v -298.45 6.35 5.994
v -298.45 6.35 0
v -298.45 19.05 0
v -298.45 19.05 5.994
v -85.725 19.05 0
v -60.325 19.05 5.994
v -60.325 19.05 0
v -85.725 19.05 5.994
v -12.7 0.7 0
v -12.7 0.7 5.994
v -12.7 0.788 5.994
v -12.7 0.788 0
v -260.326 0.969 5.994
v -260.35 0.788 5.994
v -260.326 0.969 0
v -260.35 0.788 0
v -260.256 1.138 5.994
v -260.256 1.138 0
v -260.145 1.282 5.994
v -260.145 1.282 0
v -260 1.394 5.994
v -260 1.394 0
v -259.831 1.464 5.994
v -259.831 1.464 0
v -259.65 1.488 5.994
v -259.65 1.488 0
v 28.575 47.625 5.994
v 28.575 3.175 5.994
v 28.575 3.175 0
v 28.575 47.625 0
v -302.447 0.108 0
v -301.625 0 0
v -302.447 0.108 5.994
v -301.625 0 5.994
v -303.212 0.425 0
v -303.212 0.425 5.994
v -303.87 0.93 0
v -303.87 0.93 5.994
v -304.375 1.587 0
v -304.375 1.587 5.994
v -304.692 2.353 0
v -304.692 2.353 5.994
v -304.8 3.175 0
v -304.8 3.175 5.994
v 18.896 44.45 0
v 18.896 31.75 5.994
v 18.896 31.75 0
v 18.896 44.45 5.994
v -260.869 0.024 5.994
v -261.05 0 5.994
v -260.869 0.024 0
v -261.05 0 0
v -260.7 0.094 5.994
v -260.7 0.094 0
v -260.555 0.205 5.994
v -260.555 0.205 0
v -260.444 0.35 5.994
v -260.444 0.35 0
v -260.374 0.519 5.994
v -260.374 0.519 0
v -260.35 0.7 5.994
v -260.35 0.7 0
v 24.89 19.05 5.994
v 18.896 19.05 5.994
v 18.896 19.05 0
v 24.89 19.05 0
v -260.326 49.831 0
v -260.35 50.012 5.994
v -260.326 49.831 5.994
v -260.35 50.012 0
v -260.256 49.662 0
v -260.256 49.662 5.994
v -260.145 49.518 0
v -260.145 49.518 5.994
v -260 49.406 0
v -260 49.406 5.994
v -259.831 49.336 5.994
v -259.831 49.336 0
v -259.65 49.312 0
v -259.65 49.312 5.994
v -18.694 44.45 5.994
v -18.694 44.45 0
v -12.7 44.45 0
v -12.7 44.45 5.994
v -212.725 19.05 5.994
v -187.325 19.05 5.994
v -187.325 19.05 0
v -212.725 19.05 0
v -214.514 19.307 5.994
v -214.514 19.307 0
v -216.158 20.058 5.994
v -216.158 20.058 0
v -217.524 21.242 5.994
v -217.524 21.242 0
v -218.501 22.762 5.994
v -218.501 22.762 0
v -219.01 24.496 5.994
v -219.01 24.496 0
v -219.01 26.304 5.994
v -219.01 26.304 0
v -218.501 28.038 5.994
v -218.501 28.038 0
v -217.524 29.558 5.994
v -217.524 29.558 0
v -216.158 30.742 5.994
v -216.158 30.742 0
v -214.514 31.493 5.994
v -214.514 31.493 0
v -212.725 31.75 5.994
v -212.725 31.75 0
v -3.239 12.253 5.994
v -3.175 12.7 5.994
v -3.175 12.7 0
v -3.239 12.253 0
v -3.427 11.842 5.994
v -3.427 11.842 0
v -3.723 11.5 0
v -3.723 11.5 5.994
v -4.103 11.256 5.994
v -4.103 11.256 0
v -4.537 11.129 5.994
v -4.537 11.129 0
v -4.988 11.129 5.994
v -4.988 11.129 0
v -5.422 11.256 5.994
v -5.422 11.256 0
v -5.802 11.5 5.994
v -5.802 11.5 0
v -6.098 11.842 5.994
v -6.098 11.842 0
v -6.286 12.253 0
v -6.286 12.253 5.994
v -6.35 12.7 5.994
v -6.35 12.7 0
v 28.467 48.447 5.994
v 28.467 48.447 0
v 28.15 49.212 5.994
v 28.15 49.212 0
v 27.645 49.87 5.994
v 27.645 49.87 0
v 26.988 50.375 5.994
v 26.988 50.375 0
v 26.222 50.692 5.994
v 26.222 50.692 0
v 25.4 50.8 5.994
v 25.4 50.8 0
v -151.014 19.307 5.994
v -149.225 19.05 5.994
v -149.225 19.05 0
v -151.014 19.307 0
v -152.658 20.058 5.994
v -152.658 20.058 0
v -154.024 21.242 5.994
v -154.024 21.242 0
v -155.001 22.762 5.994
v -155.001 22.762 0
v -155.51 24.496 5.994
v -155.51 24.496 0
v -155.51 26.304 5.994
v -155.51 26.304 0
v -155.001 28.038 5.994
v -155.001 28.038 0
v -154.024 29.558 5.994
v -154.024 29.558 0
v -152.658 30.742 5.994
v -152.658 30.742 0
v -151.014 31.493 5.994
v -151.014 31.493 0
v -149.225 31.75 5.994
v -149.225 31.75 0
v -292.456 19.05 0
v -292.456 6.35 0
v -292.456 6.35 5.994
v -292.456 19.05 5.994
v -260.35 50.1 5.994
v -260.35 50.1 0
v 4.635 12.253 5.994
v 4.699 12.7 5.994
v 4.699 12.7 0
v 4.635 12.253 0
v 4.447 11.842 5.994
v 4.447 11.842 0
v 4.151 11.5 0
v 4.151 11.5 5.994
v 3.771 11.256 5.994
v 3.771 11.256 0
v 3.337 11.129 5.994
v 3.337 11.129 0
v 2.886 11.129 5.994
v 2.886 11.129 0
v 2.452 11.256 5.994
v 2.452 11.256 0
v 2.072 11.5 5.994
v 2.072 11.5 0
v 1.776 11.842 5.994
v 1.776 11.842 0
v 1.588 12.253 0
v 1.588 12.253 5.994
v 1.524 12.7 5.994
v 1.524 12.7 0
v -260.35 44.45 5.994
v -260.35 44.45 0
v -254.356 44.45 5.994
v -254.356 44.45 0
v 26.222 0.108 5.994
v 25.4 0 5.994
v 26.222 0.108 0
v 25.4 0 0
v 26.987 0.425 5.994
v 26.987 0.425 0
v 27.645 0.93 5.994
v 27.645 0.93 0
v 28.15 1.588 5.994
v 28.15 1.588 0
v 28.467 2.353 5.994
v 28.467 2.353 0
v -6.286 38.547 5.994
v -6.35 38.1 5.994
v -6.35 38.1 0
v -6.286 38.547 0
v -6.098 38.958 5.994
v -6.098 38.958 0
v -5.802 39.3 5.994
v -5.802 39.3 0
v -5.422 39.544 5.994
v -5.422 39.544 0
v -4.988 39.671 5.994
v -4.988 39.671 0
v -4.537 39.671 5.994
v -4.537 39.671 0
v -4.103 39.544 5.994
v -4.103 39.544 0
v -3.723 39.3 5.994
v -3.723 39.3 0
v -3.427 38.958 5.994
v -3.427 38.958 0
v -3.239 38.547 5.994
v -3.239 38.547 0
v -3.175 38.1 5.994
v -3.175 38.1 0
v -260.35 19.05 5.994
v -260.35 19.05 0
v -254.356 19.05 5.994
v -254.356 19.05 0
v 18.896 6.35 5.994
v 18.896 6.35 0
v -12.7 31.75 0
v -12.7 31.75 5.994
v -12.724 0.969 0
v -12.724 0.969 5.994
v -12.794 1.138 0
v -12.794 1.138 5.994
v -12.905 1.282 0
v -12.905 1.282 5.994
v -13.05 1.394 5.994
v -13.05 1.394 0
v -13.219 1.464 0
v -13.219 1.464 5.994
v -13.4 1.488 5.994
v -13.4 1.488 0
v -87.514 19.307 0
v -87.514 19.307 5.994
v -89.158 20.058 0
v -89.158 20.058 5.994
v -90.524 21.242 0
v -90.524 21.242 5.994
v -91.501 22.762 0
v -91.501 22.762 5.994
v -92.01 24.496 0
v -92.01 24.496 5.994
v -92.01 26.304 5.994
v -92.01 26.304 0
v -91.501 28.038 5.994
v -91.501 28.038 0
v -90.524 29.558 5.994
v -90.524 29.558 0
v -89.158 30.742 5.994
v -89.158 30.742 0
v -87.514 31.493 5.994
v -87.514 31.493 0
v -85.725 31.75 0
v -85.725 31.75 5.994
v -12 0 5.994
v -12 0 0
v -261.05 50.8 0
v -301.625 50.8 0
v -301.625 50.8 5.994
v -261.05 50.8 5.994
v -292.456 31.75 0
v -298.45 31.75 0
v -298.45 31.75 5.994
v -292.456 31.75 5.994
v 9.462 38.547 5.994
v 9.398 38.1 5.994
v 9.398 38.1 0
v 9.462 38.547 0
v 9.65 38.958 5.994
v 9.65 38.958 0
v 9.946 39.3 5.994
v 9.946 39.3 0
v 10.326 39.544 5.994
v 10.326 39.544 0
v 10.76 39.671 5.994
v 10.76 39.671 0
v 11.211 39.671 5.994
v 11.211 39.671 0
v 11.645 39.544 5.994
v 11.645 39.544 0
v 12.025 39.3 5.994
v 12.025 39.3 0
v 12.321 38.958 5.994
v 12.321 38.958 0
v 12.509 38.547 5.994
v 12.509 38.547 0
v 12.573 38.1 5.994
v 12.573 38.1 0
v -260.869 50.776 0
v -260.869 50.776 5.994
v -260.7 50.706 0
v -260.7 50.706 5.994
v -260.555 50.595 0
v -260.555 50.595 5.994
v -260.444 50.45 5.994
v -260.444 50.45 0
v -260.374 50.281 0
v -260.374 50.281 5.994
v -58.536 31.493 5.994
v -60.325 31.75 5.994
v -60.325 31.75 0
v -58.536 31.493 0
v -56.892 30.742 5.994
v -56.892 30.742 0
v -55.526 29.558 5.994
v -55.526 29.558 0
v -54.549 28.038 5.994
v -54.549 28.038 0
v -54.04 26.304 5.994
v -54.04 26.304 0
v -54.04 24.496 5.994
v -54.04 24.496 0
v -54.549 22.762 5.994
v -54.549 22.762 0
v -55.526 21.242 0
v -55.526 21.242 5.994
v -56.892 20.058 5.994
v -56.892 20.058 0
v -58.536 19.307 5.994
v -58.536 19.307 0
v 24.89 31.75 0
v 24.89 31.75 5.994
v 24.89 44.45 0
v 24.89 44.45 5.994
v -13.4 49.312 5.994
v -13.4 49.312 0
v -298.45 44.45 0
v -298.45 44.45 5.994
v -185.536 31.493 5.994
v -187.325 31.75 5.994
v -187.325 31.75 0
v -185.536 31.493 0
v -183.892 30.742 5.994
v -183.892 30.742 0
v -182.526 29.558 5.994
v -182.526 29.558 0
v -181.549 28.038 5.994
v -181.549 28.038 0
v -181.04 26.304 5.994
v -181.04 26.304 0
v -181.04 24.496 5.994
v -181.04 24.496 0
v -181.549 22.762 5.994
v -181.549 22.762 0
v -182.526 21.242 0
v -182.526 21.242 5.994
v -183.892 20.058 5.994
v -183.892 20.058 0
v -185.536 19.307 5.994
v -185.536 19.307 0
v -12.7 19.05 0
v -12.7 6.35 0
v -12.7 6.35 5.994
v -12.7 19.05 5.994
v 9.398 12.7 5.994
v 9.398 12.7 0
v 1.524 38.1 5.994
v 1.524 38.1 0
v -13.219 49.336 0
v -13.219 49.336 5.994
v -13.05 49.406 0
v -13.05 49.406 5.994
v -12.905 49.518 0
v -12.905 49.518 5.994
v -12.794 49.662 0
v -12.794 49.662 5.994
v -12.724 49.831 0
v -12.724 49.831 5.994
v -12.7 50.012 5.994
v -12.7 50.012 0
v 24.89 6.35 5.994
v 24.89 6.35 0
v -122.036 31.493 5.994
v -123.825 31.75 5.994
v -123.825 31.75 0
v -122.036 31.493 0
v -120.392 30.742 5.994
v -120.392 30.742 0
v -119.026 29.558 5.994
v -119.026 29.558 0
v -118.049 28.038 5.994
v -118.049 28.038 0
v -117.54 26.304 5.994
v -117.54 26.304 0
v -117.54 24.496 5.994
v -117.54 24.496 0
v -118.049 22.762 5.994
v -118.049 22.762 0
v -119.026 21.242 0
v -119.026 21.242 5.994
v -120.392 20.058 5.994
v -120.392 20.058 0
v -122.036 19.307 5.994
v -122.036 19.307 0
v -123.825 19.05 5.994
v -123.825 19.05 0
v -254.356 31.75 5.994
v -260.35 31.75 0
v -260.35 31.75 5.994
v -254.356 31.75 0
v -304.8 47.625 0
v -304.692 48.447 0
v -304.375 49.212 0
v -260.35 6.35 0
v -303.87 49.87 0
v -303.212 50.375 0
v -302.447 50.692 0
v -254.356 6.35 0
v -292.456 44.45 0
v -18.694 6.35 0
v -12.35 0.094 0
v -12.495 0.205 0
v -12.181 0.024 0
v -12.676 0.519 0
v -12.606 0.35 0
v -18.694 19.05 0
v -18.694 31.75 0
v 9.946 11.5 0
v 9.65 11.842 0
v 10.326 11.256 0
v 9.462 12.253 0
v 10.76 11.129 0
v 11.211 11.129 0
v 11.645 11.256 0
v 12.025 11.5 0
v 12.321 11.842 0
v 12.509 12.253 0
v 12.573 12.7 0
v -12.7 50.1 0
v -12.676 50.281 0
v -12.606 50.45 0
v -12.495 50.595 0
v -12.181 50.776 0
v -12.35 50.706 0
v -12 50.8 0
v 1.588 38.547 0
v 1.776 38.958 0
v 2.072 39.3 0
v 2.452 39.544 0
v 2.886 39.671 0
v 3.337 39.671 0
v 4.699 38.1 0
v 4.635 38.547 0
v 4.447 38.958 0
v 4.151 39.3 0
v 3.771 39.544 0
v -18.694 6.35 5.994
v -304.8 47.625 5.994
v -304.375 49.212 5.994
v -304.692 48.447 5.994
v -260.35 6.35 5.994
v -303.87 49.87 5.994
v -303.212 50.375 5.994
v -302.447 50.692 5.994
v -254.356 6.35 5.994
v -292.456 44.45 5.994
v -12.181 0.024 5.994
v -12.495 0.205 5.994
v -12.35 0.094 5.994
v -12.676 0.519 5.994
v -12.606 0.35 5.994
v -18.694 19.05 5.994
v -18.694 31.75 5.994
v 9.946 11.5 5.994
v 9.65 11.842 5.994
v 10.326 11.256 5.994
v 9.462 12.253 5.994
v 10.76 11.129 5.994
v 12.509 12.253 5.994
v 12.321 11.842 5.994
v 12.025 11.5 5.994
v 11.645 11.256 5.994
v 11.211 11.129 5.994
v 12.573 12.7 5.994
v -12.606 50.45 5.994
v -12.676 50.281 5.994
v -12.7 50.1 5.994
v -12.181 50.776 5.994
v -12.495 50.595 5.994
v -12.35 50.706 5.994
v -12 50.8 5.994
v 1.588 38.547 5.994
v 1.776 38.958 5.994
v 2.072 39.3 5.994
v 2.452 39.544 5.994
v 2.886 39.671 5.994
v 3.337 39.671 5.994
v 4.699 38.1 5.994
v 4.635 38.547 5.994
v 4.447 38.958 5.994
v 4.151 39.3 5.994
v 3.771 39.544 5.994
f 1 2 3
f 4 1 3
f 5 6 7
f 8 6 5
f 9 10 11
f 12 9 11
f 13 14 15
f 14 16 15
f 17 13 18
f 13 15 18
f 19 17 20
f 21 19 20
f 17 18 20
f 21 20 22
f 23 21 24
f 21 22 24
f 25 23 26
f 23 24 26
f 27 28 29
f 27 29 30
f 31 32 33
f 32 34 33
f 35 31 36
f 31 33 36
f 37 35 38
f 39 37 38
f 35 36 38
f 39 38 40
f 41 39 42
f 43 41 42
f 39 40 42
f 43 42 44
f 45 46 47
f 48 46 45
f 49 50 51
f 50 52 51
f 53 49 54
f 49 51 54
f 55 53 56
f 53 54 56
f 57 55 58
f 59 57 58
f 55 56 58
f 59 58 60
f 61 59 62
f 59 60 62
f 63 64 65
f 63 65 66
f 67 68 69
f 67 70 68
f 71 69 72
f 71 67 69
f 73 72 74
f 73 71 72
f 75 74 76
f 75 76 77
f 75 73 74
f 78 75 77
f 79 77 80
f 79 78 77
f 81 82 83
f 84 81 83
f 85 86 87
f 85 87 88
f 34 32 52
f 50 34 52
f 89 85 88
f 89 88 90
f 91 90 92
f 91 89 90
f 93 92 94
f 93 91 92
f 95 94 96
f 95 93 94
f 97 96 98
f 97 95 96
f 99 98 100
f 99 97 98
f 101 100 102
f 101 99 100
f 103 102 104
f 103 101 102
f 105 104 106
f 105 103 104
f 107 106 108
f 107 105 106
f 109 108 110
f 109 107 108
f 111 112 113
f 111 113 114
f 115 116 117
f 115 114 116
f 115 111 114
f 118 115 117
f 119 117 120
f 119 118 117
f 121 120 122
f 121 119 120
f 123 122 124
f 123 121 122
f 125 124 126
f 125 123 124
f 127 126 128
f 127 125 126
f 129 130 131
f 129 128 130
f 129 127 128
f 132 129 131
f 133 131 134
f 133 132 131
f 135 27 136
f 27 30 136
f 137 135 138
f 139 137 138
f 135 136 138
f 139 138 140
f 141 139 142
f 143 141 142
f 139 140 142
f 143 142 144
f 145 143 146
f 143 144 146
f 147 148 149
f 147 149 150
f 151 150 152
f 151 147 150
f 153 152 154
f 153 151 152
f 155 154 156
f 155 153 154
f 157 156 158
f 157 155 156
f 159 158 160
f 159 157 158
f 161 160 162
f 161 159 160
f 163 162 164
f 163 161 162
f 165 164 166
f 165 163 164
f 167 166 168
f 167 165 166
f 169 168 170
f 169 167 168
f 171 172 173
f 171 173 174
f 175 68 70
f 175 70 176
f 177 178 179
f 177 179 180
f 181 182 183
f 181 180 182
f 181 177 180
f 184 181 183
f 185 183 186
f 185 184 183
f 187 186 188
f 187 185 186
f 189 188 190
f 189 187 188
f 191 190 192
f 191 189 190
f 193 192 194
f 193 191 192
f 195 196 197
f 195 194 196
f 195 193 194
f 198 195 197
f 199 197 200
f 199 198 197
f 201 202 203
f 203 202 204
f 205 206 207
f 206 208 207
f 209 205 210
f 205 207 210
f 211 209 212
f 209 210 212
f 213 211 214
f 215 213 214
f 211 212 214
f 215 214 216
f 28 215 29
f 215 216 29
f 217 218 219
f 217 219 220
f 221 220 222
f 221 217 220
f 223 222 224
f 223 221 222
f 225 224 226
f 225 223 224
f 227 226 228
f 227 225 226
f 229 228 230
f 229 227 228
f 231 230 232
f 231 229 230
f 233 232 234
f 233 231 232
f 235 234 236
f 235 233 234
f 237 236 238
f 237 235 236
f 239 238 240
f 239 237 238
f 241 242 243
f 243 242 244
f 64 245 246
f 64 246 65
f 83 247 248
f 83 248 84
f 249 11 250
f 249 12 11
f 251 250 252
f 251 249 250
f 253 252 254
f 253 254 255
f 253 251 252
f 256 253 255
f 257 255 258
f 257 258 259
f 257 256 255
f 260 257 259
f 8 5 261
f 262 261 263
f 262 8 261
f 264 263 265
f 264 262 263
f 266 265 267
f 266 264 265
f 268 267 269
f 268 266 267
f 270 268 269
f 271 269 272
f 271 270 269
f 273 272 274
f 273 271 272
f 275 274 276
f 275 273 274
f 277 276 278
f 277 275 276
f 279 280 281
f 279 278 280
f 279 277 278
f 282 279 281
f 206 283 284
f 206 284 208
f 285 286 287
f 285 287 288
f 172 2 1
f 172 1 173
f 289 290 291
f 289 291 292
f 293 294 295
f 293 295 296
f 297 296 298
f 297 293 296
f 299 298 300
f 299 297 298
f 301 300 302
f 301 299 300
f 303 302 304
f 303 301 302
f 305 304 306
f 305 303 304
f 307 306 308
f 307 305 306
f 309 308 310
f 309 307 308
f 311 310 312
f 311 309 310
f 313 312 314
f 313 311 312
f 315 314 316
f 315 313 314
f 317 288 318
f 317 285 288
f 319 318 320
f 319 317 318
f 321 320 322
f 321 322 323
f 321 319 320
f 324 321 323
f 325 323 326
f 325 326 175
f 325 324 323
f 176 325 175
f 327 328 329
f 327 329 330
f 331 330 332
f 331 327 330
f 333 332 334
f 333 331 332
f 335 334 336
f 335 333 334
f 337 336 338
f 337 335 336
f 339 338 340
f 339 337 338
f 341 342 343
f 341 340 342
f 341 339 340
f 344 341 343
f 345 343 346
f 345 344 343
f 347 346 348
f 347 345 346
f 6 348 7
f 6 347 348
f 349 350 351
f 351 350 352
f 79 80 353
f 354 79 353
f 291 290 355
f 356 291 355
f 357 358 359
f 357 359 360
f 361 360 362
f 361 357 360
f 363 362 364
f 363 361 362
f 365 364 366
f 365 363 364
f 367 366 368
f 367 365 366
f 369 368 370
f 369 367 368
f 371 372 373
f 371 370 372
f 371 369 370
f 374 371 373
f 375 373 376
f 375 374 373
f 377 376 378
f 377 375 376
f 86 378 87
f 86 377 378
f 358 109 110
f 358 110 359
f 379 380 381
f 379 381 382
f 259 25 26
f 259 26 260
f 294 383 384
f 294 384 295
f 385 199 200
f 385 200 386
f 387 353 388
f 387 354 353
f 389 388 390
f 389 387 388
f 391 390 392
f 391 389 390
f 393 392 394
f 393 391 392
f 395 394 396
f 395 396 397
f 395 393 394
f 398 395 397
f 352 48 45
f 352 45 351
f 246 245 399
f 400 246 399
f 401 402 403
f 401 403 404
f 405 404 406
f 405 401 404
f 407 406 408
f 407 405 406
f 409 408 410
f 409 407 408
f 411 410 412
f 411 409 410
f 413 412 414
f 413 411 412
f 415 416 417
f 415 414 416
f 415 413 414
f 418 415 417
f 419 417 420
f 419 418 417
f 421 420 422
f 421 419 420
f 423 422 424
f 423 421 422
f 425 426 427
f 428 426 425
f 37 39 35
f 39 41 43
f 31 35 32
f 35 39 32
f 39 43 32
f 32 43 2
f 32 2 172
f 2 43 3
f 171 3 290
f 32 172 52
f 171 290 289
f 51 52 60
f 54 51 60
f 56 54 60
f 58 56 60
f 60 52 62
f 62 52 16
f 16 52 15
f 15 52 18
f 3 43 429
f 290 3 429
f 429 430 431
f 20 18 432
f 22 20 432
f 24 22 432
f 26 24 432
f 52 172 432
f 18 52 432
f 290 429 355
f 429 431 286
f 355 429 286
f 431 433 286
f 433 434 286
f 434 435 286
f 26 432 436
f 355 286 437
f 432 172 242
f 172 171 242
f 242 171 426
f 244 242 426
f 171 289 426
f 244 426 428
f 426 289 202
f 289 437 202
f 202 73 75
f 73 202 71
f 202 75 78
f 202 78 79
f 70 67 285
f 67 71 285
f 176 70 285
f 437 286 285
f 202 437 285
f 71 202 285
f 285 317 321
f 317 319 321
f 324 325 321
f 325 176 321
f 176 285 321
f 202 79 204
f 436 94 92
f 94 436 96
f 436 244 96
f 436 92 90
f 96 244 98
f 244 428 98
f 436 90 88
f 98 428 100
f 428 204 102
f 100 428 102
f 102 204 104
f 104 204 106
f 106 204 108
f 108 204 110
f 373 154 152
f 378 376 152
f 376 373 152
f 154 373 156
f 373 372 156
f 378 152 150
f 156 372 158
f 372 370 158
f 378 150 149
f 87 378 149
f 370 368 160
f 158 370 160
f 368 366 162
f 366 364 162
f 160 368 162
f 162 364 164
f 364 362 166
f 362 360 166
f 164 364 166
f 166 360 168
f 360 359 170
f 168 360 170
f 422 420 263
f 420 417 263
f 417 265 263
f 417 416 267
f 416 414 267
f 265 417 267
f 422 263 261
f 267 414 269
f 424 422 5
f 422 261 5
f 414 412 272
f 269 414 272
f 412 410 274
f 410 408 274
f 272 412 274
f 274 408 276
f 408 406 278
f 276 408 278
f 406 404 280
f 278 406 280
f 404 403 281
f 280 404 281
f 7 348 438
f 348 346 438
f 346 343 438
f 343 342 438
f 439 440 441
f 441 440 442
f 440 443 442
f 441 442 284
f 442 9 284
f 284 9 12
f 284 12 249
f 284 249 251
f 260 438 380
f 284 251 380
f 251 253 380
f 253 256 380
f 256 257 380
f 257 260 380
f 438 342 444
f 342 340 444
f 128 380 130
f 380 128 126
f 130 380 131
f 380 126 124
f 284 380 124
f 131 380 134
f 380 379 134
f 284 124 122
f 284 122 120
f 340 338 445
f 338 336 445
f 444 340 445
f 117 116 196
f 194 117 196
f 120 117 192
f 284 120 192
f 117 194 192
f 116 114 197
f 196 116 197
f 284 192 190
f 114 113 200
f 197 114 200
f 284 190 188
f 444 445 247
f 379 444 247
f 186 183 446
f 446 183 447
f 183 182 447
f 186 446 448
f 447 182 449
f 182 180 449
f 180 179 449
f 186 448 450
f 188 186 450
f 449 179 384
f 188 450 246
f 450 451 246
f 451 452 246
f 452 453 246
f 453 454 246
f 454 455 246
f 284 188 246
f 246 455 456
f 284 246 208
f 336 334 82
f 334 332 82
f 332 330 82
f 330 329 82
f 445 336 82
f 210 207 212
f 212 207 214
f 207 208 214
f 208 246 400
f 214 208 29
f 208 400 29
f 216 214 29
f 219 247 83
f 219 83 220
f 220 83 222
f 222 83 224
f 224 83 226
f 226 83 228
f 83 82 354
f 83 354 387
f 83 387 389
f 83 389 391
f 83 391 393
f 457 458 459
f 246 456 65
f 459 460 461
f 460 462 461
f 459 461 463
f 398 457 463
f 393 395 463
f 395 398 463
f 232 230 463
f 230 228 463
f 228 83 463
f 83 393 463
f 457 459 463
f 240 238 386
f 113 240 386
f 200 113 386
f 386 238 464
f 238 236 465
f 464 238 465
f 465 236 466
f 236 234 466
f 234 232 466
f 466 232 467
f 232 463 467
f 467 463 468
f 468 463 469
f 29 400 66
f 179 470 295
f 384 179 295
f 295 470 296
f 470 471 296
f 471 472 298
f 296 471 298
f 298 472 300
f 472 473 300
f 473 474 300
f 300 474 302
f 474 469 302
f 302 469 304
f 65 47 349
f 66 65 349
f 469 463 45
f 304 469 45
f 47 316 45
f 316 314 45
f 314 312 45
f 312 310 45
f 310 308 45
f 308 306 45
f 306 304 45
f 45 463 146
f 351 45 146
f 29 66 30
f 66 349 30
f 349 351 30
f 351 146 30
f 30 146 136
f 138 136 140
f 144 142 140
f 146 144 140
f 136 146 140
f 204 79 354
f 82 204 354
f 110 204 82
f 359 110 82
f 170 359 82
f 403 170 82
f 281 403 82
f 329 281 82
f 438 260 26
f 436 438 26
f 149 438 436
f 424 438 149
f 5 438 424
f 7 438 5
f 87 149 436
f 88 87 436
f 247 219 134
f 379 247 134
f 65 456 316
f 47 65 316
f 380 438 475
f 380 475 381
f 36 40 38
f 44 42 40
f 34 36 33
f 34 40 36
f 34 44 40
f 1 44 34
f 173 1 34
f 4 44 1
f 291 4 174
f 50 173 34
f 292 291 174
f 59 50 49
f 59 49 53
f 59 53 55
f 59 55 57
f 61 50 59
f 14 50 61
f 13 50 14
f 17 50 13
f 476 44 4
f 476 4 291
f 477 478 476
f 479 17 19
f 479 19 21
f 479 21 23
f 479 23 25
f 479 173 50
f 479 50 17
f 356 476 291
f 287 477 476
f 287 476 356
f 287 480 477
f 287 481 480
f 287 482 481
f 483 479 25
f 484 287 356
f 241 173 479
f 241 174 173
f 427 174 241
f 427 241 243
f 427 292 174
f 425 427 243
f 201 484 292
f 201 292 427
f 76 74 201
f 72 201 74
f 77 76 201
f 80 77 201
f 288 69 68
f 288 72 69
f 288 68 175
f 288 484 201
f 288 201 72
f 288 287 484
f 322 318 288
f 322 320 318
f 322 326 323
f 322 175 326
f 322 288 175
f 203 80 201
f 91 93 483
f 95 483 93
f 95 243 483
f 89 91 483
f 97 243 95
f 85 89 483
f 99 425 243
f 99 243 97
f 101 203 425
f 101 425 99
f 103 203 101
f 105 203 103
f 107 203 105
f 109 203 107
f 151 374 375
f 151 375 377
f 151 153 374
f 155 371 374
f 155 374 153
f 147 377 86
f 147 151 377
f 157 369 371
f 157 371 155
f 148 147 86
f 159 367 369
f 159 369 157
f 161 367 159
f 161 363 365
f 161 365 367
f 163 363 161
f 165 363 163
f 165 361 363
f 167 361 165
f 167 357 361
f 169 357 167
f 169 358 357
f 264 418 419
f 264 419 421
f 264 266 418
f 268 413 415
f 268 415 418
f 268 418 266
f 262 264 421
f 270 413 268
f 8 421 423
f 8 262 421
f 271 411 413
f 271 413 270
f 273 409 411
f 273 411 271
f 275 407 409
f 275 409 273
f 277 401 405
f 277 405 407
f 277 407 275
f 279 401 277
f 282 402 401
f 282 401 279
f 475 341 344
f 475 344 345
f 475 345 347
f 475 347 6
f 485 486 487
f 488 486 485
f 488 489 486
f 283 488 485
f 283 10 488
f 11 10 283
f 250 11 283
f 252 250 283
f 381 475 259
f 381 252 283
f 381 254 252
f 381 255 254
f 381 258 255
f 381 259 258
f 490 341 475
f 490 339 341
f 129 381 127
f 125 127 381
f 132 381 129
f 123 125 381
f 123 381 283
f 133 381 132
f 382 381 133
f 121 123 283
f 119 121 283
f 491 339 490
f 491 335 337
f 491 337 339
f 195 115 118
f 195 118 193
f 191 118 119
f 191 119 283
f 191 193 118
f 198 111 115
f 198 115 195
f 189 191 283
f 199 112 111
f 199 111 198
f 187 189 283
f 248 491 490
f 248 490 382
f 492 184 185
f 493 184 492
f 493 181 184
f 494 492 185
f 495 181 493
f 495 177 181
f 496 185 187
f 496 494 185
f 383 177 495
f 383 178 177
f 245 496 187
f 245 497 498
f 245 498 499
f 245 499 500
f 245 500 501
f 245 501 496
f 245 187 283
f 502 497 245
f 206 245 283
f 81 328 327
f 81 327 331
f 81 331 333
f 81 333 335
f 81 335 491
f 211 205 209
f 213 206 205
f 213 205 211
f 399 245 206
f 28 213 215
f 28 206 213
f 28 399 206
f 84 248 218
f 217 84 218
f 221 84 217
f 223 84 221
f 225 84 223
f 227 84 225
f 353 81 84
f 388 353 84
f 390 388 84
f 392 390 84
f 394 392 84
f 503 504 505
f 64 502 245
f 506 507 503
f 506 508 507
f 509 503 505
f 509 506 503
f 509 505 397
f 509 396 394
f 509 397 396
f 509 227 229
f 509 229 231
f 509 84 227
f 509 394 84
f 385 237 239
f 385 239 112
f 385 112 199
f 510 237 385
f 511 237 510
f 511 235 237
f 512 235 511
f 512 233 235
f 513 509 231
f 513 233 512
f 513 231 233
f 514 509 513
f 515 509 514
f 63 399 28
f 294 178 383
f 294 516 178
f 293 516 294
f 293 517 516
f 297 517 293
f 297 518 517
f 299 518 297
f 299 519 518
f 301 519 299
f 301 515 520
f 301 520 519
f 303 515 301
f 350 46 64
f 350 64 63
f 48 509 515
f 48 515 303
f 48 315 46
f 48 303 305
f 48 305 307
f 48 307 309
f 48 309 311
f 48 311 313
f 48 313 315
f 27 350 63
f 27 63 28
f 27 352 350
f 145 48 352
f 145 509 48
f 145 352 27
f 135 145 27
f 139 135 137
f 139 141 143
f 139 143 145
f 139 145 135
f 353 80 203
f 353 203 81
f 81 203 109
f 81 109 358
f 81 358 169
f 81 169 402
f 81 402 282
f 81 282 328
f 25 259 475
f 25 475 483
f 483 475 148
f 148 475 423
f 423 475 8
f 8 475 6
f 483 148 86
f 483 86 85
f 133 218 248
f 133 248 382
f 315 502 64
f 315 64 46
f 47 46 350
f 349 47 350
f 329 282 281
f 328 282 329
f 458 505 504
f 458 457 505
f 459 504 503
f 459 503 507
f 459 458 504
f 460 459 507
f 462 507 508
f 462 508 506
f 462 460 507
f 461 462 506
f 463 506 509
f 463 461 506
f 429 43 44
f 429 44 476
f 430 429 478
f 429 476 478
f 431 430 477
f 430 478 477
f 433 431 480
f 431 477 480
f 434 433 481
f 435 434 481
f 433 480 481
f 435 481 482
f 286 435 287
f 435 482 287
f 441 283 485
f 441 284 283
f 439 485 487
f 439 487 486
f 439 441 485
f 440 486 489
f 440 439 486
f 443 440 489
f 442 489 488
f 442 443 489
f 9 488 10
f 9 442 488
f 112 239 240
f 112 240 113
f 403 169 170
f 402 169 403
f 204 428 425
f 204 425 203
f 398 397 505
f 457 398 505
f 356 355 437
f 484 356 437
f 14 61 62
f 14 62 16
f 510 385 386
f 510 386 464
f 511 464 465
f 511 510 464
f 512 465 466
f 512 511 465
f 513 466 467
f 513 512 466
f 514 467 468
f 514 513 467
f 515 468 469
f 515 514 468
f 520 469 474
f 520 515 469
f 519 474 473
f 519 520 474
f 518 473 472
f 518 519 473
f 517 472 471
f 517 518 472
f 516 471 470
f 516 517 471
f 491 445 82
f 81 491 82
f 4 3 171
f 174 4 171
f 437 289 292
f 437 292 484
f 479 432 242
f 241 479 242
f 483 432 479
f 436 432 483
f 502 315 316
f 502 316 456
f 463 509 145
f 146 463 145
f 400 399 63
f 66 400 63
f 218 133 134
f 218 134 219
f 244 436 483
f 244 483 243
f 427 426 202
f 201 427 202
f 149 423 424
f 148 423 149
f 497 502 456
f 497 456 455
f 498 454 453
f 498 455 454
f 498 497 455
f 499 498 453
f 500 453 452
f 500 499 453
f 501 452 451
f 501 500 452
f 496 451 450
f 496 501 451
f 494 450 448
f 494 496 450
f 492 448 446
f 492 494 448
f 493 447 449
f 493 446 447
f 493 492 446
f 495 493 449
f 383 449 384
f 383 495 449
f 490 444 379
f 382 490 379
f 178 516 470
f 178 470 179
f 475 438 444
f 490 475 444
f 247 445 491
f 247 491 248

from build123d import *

# Parameters (mm, degrees)
SKETCH1_W           = 304.8
SKETCH1_H           = 50.8
SKETCH1_W_2         = 5.9944
SKETCH1_H_2         = 12.7
BOSS_EXTRUDE1_DEPTH = 5.9944
SKETCH3_W           = 247.65
SKETCH3_H           = 1.4875
CUT_EXTRUDE3_DEPTH  = 6.9944
FILLET4_R           = 0.7
SKETCH4_W           = 28.575
SKETCH4_H           = 50.8
BOSS_EXTRUDE2_DEPTH = 5.9944
SKETCH5_W           = 5.9944
SKETCH5_H           = 12.7
CUT_EXTRUDE4_DEPTH  = 6.9944
FILLET5_R           = 3.175
CUT_EXTRUDE5_DEPTH  = 6.9944
CUT_EXTRUDE6_DEPTH  = 6.9944


with BuildPart() as part:
    # Sketch1 → Boss-Extrude1 (new body)
    with BuildSketch(Plane.XY):
        with Locations((-152.4, 25.4)):
            Rectangle(SKETCH1_W, SKETCH1_H)
        with Locations((-15.6972, 12.7)):
            Rectangle(SKETCH1_W_2, SKETCH1_H_2, mode=Mode.SUBTRACT)
        with Locations((-15.6972, 38.1)):
            Rectangle(SKETCH1_W_2, SKETCH1_H_2, mode=Mode.SUBTRACT)
        with Locations((-257.3528, 38.1)):
            Rectangle(SKETCH1_W_2, SKETCH1_H_2, mode=Mode.SUBTRACT)
        with Locations((-257.3528, 12.7)):
            Rectangle(SKETCH1_W_2, SKETCH1_H_2, mode=Mode.SUBTRACT)
        with Locations((-295.4528, 12.7)):
            Rectangle(SKETCH1_W_2, SKETCH1_H_2, mode=Mode.SUBTRACT)
        with Locations((-295.4528, 38.1)):
            Rectangle(SKETCH1_W_2, SKETCH1_H_2, mode=Mode.SUBTRACT)
    extrude(amount=BOSS_EXTRUDE1_DEPTH)

    # Sketch3 → Cut-Extrude3 (cut, through all)
    with BuildSketch(Plane.XY.offset(5.9944)):
        with Locations((-136.525, 50.05625)):
            Rectangle(SKETCH3_W, SKETCH3_H)
        with Locations((-136.525, 0.74375)):
            Rectangle(SKETCH3_W, SKETCH3_H)
    extrude(amount=-CUT_EXTRUDE3_DEPTH, mode=Mode.SUBTRACT)

    # Fillet4
    fillet4_edges = [part.edges().sort_by_distance(p)[0] for p in [
        (-260.35, 49.3125, 2.9972),
        (-260.35, 50.8, 2.9972),
        (-12.7, 50.8, 2.9972),
        (-12.7, 49.3125, 2.9972),
        (-12.7, 0, 2.9972),
        (-260.35, 0, 2.9972),
        (-260.35, 1.4875, 2.9972),
        (-12.7, 1.4875, 2.9972),
    ]]
    fillet(fillet4_edges, radius=FILLET4_R)

    # Sketch4 → Boss-Extrude2 (add)
    with BuildSketch(Plane.XY.offset(5.9944)):
        with Locations((14.2875, 25.4)):
            Rectangle(SKETCH4_W, SKETCH4_H)
    extrude(amount=-BOSS_EXTRUDE2_DEPTH)

    # Sketch5 → Cut-Extrude4 (cut, through all)
    with BuildSketch(Plane.XY.offset(5.9944)):
        with Locations((21.893276, 38.1)):
            Rectangle(SKETCH5_W, SKETCH5_H)
        with Locations((21.893276, 12.7)):
            Rectangle(SKETCH5_W, SKETCH5_H)
    extrude(amount=-CUT_EXTRUDE4_DEPTH, mode=Mode.SUBTRACT)

    # Fillet5
    fillet5_edges = [part.edges().sort_by_distance(p)[0] for p in [
        (28.575, 50.8, 2.9972),
        (28.575, 0, 2.9972),
        (-304.8, 0, 2.9972),
        (-304.8, 50.8, 2.9972),
    ]]
    fillet(fillet5_edges, radius=FILLET5_R)

    # Sketch6 → Cut-Extrude5 (cut, through all)
    with BuildSketch(Plane.XY.offset(5.9944)):
        with BuildLine():
            Line((-123.825, 19.05), (-149.225, 19.05))
            ThreePointArc((-149.225, 19.05), (-155.575, 25.4), (-149.225, 31.75))
            Line((-149.225, 31.75), (-123.825, 31.75))
            ThreePointArc((-123.825, 31.75), (-117.475, 25.4), (-123.825, 19.05))
        make_face()
        with BuildLine():
            Line((-60.325, 19.05), (-85.725, 19.05))
            ThreePointArc((-85.725, 19.05), (-92.075, 25.4), (-85.725, 31.75))
            Line((-85.725, 31.75), (-60.325, 31.75))
            ThreePointArc((-60.325, 31.75), (-53.975, 25.4), (-60.325, 19.05))
        make_face()
        with BuildLine():
            Line((-187.325, 19.05), (-212.725, 19.05))
            ThreePointArc((-212.725, 19.05), (-219.075, 25.4), (-212.725, 31.75))
            Line((-212.725, 31.75), (-187.325, 31.75))
            ThreePointArc((-187.325, 31.75), (-180.975, 25.4), (-187.325, 19.05))
        make_face()
    extrude(amount=-CUT_EXTRUDE5_DEPTH, mode=Mode.SUBTRACT)

    # Sketch7 → Cut-Extrude6 (cut, through all)
    with BuildSketch(Plane.XY.offset(5.9944)):
        with BuildLine():
            Line((-6.35, 12.7), (-6.35, 38.1))
            ThreePointArc((-6.35, 38.1), (-4.7625, 39.6875), (-3.175, 38.1))
            Line((-3.175, 38.1), (-3.175, 12.7))
            ThreePointArc((-3.175, 12.7), (-4.7625, 11.1125), (-6.35, 12.7))
        make_face()
        with BuildLine():
            Line((1.524, 12.7), (1.524, 38.1))
            ThreePointArc((1.524, 38.1), (3.1115, 39.6875), (4.699, 38.1))
            Line((4.699, 38.1), (4.699, 12.7))
            ThreePointArc((4.699, 12.7), (3.1115, 11.1125), (1.524, 12.7))
        make_face()
        with BuildLine():
            Line((9.398, 12.7), (9.398, 38.1))
            ThreePointArc((9.398, 38.1), (10.9855, 39.6875), (12.573, 38.1))
            Line((12.573, 38.1), (12.573, 12.7))
            ThreePointArc((12.573, 12.7), (10.9855, 11.1125), (9.398, 12.7))
        make_face()
    extrude(amount=-CUT_EXTRUDE6_DEPTH, mode=Mode.SUBTRACT)


solid = part.part
